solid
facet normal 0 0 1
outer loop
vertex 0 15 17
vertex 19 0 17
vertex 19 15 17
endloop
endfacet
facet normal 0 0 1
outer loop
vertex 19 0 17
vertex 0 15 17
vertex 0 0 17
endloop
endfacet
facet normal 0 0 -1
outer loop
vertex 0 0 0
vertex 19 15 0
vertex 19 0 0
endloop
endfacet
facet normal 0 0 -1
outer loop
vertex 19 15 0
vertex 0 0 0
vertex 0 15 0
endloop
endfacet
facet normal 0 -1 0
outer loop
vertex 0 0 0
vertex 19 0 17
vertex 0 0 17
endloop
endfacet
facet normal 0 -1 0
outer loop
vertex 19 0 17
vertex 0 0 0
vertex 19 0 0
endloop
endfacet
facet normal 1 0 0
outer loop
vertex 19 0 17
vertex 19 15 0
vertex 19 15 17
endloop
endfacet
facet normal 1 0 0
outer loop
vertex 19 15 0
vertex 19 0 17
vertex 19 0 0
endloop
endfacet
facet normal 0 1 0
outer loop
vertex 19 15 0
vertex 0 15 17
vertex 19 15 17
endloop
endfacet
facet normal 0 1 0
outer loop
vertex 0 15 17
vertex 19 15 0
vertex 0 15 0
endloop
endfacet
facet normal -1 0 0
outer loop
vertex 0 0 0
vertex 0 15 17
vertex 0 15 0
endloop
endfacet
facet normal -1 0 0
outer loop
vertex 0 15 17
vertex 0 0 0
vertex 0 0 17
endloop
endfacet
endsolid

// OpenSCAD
// Generated by SolidPython 1.0.1 on 2020-07-29 00:46:56


cube(size = [19, 15, 17]);
/***********************************************
*********      SolidPython code:      **********
************************************************
 
# import packages: SolidPython
from solid import *
from solid.utils import *
from itertools import chain, combinations, permutations


class Resize:

    def __init__(self, scad_file):
        self.scad_file = scad_file
        #self.scad_file = import_scad(scad_file)
        # cone/cylinder param:
        self.r1 = 0
        self.r2 = 0
        self.h = 0
        # rectangular prism param:
        self.w = 0
        self.l = 0
        # ellipse param:
        self.r = 0

    # import OpenScad code (file name corresponds to shape)


    # classify shape + parameters
    def assign(self, param1, param2, param3):
        if self.scad_file == 'cone.scad':
            self.r1 = param1
            self.r2 = param2
            self.h = param3
        elif self.scad_file == 'cylinder.scad':
            self.r1 = param1
            self.r2 = param2
            self.h = param3
        elif self.scad_file == 'rectangularPrism.scad':
            self.h = param1
            self.l = param2
            self.w = param3
        else:
            self.r = param1
            self.h = param2

    # resize parameters
    def iterate(self):
        x = range(3, 20, 2)
        i = 1
        if self.scad_file == 'cone.scad':
            tempList = list(permutations(x, 2))
            for temp in tempList:
                param1 = temp[0]
                param2 = temp[1]
                filepath = 'produced_scad_files/' + 'cone' + str(param1) + '_' + str(param2) + '_' + '.scad'
                scad_render_to_file(cylinder(h=param1, r1=param2, r2=0), filepath)

        elif self.scad_file == 'cylinder.scad':
            tempList = list(permutations(x, 3))
            for temp in tempList:
                param1 = temp[0]
                param2 = temp[1]
                filepath = 'produced_scad_files/' + 'cylinder' + str(param1) + '_' + str(param2) + '_' + '.scad'
                scad_render_to_file(cylinder(h=param1, r1=param2, r2=param2), filepath)

        elif self.scad_file == 'rectangularPrism.scad':
            tempList = list(permutations(x, 3))
            for temp in tempList:
                param1 = temp[0]
                param2 = temp[1]
                param3 = temp[2]
                filepath = 'produced_scad_files/' + 'rectangularPrism' + str(param1) + '_' + str(param2) + '_' + str(
                    param3) + '.scad'
                scad_render_to_file(cube(size=(param1, param2, param3)), filepath)

        elif self.scad_file == 'ellipse.scad':
            tempList = list(permutations(x, 4))
            for temp in tempList:
                param1 = temp[0]
                param2 = temp[1]
                param3 = temp[2]
                param4 = temp[3]
                filepath = 'produced_scad_files/' + 'ellipse' + str(param1) + '_' + str(param2) + '_' + str(param3) + '_' + str(param4) + '.scad'
                scad_render_to_file(scale([param1, param2, param3])(sphere(r=param4)), filepath)

    def render_to_scadfile(self):
        scad_render_to_file(scad, 'example.scad') 
 
************************************************/
